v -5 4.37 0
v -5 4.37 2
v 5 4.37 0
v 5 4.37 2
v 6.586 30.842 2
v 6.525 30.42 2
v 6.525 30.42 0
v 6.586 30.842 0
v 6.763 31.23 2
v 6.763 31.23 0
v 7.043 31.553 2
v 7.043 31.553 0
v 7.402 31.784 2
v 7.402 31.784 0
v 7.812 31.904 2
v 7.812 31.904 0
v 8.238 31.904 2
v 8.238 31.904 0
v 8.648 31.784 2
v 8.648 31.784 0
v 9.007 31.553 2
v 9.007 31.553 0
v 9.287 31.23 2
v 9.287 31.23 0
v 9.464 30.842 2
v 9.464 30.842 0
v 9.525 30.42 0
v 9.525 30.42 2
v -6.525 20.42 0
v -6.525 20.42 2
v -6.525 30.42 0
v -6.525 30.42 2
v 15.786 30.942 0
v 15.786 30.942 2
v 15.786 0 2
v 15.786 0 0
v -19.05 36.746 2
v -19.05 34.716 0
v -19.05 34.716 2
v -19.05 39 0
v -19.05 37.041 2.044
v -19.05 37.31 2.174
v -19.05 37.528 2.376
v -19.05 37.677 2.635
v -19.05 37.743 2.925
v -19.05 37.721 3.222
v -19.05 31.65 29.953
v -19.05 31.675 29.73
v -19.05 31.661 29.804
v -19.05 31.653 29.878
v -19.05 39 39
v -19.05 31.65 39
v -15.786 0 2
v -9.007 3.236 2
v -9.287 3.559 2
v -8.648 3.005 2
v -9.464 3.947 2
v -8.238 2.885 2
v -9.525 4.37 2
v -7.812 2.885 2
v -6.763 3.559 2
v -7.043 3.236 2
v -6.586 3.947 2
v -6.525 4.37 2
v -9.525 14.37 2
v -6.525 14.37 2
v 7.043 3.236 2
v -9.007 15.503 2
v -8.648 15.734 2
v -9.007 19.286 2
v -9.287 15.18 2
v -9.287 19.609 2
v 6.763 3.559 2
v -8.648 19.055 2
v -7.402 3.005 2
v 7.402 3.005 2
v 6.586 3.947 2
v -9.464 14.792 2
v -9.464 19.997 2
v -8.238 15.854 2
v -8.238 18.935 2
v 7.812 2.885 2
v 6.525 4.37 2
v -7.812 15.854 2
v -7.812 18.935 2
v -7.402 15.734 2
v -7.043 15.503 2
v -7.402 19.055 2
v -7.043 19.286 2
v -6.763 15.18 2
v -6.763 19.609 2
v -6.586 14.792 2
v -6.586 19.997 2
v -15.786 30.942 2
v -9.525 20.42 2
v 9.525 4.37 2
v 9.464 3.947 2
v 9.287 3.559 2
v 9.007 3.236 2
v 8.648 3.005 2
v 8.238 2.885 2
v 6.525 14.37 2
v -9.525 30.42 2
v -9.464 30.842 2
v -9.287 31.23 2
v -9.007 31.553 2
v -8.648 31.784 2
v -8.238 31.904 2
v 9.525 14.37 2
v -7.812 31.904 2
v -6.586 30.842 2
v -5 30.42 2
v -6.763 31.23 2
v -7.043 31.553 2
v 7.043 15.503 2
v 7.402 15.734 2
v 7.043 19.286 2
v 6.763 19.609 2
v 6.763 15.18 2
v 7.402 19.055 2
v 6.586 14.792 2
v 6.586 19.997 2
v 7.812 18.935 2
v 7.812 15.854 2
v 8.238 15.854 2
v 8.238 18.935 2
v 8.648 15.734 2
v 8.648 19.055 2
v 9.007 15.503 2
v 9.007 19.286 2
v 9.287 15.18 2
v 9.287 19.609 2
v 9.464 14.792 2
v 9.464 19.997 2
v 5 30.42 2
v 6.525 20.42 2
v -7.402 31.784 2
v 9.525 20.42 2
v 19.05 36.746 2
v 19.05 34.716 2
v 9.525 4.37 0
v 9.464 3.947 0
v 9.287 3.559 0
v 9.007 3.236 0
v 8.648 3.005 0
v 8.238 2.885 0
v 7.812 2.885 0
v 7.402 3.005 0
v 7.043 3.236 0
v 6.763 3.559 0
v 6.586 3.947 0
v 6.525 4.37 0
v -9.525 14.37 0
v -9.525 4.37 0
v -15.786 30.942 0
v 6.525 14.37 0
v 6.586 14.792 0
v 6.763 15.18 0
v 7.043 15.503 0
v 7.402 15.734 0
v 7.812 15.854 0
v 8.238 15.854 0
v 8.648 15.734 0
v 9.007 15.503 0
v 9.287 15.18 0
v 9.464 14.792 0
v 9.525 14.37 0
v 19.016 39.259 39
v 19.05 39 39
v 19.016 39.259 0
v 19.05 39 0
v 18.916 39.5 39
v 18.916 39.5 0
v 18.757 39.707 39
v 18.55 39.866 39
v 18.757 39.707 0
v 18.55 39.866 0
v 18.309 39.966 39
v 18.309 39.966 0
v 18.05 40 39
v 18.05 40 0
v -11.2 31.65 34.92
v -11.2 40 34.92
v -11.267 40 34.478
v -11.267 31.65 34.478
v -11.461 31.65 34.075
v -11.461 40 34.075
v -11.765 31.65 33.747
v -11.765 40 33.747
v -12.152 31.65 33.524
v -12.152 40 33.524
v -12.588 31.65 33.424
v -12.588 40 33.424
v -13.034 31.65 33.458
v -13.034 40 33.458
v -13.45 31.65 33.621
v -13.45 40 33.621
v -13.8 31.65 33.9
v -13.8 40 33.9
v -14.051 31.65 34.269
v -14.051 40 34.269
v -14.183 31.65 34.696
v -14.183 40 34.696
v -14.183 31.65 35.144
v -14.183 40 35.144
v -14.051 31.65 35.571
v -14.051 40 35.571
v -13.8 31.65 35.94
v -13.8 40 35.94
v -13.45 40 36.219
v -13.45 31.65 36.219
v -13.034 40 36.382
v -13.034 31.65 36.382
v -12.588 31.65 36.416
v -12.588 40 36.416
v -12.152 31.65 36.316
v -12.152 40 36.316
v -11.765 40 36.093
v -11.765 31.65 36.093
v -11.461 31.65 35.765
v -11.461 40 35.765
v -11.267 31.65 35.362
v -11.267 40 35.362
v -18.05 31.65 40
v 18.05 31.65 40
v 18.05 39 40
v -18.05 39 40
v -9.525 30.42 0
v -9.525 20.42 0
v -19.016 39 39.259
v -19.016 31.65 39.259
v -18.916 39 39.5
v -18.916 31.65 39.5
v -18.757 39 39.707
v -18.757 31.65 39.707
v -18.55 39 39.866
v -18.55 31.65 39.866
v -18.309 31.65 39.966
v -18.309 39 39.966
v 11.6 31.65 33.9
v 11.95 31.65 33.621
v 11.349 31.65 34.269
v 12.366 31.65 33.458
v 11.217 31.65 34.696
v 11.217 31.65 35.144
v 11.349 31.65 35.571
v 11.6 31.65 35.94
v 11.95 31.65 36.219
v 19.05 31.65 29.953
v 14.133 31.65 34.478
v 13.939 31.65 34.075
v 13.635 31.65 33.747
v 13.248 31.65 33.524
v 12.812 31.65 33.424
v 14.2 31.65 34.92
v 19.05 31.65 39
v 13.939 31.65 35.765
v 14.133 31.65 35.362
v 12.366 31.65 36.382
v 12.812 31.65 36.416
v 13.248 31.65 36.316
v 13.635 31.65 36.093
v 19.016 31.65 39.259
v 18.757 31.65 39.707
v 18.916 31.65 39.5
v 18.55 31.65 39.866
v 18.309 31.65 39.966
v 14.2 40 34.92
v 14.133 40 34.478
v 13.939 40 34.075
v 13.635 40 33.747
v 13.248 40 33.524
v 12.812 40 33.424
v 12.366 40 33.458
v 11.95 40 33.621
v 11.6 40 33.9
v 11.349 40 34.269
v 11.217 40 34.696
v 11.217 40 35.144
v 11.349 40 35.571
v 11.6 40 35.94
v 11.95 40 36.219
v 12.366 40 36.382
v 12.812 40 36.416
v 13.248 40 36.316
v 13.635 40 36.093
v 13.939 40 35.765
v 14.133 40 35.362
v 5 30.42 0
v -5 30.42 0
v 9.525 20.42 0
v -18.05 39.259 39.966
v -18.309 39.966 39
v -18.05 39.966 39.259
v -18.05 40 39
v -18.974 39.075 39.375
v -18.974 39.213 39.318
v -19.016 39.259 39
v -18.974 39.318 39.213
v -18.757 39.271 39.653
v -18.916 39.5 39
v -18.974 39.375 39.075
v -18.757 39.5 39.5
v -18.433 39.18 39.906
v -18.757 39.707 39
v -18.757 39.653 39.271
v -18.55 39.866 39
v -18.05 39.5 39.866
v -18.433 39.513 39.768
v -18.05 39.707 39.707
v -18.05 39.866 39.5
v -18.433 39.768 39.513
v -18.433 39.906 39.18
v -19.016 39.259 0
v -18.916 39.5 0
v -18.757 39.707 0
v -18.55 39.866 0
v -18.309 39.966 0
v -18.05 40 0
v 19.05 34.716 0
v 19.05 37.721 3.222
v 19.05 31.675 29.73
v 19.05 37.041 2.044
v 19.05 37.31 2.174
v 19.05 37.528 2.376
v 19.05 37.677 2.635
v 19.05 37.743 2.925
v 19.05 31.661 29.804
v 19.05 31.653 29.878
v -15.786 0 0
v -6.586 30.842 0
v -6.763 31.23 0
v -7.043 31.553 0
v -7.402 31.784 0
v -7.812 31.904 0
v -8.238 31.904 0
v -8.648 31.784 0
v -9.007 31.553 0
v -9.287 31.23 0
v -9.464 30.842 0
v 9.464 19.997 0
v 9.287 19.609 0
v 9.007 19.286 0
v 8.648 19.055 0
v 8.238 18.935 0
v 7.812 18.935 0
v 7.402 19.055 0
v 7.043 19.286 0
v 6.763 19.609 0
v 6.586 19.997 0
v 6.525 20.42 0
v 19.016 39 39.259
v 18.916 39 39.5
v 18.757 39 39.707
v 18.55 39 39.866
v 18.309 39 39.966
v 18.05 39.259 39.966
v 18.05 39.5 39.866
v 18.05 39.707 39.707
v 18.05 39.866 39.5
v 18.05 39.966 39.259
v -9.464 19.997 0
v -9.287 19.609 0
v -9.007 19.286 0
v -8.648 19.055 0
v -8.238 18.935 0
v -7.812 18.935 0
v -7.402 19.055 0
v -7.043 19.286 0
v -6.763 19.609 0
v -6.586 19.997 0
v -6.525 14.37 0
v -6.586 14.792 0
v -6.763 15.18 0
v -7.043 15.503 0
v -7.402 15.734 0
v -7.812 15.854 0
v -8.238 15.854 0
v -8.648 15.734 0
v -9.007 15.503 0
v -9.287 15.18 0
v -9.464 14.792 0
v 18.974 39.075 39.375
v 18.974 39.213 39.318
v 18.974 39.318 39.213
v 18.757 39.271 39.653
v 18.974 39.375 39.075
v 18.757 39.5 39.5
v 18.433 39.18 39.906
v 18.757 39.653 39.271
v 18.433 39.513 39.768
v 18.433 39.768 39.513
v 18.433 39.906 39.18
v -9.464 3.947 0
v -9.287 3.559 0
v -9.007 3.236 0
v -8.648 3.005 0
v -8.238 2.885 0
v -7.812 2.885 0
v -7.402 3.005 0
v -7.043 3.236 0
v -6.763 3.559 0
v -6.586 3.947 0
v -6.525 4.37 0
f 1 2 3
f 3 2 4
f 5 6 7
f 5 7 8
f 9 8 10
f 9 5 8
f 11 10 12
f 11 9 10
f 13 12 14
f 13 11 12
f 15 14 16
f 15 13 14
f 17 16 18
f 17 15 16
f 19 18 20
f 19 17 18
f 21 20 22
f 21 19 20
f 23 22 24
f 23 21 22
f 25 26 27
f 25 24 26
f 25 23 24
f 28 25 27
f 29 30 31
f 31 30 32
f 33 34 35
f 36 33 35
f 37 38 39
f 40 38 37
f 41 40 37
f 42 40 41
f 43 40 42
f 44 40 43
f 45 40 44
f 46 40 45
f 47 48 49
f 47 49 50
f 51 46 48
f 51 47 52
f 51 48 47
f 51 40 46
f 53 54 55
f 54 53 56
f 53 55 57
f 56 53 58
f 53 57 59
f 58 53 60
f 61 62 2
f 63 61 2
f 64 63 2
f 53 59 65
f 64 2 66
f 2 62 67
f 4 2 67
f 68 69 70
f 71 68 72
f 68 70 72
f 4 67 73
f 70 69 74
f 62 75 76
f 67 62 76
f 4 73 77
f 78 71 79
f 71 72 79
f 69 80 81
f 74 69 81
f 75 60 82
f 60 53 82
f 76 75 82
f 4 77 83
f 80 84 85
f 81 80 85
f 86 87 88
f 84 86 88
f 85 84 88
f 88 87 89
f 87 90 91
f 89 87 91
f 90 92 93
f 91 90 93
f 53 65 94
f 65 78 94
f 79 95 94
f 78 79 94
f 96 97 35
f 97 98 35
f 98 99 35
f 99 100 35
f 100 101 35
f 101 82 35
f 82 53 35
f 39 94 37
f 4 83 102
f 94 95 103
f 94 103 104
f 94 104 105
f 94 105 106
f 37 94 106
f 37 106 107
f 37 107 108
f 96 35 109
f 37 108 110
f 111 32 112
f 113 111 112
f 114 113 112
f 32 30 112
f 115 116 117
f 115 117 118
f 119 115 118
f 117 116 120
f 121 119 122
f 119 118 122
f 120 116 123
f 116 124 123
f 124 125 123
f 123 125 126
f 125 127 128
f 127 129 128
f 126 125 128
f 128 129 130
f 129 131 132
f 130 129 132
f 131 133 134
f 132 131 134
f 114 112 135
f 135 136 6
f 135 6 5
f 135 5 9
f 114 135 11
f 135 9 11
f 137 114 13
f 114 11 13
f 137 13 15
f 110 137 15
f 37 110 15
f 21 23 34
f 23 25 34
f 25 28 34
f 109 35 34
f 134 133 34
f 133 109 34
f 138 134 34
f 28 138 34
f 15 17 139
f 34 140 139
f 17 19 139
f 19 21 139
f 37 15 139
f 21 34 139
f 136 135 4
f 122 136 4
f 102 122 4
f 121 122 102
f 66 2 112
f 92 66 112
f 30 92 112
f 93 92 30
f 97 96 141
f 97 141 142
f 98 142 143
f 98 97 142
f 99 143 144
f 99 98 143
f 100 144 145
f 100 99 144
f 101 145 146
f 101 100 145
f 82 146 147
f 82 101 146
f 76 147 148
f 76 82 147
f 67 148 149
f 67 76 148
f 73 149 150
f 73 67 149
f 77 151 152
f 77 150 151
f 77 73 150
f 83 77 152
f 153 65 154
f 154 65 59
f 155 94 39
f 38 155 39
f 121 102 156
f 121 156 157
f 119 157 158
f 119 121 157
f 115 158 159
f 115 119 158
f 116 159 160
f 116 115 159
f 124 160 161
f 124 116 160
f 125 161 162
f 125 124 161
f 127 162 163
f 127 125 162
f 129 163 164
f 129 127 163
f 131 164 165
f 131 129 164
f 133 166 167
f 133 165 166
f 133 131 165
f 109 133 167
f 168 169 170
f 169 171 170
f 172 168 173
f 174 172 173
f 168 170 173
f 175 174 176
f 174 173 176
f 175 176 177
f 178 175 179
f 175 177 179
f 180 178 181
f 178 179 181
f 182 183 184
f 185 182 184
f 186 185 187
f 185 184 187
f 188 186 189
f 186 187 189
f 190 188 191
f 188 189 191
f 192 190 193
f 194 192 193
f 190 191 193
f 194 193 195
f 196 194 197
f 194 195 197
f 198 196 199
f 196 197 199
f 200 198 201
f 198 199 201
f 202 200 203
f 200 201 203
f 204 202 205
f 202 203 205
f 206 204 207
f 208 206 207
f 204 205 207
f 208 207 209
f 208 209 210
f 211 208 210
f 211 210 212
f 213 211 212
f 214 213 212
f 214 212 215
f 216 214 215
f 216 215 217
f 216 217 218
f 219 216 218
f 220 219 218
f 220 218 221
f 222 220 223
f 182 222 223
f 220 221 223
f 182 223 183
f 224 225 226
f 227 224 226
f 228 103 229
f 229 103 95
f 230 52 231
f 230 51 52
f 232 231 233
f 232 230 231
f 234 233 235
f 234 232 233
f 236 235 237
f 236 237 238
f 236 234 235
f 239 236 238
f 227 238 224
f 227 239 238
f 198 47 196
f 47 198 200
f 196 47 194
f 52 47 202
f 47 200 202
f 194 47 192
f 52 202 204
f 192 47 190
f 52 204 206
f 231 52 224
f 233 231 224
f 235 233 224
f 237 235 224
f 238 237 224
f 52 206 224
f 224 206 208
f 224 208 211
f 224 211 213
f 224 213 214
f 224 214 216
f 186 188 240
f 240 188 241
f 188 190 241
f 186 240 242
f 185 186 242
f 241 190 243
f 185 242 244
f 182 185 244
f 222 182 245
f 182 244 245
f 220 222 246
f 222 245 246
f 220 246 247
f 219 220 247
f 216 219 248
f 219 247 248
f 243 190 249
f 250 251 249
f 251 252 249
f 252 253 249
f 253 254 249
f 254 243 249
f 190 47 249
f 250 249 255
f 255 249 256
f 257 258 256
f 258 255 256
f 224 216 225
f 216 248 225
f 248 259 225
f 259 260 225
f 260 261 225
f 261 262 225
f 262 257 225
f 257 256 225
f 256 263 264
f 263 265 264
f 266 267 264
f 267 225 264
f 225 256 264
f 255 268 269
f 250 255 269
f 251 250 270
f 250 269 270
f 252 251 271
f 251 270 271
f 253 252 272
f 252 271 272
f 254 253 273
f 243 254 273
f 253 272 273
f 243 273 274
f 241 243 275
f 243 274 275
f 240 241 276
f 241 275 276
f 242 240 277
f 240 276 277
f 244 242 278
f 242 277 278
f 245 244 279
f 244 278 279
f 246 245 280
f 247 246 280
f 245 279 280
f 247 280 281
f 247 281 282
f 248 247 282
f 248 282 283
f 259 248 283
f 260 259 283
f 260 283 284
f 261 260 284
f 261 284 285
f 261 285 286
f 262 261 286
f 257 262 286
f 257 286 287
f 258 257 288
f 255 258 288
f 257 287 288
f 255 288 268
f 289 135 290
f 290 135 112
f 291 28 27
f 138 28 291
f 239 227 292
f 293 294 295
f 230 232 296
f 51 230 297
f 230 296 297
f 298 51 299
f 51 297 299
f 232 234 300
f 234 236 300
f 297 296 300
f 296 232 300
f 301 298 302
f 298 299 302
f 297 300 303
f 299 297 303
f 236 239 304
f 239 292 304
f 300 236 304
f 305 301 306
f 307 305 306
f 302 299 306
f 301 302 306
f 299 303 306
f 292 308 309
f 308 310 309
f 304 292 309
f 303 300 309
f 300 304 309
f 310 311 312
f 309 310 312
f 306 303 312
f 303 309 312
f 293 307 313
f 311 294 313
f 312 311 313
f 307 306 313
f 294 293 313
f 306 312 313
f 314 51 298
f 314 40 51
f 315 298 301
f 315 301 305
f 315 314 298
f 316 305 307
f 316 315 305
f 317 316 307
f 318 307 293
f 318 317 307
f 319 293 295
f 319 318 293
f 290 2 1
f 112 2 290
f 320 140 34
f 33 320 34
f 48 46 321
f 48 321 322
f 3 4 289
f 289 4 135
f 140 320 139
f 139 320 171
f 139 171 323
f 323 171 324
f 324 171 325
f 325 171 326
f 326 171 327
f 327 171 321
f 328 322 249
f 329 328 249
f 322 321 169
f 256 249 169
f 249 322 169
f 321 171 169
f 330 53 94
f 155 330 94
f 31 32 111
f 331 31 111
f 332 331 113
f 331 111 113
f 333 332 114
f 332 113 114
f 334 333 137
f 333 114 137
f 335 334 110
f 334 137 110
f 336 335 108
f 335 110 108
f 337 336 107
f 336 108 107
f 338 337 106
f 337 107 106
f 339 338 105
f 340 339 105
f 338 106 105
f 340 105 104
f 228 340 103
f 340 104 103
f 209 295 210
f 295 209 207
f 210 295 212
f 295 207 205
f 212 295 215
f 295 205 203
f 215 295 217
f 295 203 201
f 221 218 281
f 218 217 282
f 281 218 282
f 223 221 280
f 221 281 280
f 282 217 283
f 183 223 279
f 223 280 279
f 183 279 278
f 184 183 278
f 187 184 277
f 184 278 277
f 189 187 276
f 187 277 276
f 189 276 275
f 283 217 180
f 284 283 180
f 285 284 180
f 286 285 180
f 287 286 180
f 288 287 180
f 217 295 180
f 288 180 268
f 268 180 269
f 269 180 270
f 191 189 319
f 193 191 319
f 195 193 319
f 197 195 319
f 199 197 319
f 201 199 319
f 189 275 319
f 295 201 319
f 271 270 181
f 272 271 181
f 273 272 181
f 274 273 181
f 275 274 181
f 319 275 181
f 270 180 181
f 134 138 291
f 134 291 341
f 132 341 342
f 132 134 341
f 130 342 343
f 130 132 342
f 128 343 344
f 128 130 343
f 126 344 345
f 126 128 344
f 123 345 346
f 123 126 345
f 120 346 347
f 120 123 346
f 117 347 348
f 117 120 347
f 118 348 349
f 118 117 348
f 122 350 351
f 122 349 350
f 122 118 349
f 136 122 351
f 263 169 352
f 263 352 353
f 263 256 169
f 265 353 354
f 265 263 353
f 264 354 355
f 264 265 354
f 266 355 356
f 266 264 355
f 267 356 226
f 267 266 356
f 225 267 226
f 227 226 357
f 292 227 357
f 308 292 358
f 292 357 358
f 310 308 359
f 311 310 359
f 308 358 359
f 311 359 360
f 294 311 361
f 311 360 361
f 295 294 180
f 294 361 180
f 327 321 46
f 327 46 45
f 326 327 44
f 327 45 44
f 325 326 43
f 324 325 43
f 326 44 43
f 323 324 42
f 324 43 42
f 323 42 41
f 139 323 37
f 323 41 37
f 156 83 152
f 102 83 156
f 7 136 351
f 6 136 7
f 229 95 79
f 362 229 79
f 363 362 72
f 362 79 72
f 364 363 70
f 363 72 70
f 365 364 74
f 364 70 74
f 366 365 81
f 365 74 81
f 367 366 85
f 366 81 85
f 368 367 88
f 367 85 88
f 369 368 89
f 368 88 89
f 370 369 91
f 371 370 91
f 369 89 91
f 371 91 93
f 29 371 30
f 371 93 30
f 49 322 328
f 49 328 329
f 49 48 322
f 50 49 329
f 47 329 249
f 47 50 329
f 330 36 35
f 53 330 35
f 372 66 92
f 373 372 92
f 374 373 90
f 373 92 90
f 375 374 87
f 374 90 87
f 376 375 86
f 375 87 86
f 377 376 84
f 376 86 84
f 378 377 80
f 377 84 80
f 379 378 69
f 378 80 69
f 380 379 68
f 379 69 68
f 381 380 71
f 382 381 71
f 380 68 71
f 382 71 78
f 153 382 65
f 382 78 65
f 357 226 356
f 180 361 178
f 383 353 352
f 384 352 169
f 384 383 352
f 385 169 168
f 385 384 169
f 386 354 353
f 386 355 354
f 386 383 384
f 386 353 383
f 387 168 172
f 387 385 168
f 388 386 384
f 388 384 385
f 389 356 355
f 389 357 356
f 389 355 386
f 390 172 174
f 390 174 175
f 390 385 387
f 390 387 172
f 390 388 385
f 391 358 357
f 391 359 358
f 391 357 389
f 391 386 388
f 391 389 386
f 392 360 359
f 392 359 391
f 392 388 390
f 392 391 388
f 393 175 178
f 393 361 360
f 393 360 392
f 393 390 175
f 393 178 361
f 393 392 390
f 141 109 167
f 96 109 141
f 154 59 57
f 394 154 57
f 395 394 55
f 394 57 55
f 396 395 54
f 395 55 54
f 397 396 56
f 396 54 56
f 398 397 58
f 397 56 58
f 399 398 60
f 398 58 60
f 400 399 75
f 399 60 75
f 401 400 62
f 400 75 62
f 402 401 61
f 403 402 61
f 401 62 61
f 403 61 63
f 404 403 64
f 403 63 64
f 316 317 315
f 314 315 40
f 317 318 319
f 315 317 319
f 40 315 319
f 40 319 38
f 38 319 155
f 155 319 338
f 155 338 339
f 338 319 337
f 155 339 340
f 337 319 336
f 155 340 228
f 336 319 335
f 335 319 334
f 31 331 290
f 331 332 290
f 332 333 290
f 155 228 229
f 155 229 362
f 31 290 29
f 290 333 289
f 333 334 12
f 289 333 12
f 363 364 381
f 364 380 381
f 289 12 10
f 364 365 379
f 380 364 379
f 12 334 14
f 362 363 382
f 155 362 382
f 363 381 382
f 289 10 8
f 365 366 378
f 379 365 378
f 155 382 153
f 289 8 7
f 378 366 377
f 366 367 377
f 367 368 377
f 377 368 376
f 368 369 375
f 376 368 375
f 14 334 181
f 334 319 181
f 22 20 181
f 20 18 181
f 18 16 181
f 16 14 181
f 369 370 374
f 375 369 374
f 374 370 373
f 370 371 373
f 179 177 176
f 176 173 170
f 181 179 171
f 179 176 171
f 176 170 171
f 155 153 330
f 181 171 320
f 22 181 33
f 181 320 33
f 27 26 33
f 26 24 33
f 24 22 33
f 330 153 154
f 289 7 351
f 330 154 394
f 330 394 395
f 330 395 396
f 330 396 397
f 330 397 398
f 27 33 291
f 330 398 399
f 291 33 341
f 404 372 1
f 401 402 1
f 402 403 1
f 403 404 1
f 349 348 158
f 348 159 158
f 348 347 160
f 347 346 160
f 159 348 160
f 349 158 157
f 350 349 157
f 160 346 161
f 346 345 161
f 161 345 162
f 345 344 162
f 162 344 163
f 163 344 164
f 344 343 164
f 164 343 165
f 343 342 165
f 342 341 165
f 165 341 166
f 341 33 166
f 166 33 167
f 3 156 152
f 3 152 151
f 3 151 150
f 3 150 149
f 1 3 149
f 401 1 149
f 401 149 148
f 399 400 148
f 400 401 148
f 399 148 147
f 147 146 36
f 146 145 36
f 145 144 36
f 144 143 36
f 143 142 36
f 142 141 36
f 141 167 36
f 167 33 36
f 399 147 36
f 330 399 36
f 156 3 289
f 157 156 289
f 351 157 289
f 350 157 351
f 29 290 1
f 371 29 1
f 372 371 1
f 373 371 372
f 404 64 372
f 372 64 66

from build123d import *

# Parameters (mm, degrees)
BOSS_EXTRUDE1_DEPTH = 19.05
SKETCH3_W           = 5
SKETCH3_H           = 26.05
CUT_EXTRUDE2_DEPTH  = 3
BOSS_EXTRUDE2_DEPTH = 38.1
SKETCH5_R           = 1.5
CUT_EXTRUDE3_DEPTH  = 8.35
FILLET1_R           = 1


with BuildPart() as part:
    # Sketch1 → Boss-Extrude1 (new body, symmetric)
    with BuildSketch(Plane(origin=(0, 0, 0), x_dir=(0, 0, -1), z_dir=(1, 0, 0))):
        Polygon((0, 0), (-2, 0), (-2, 38), (-40, 38), (-40, 40), (0, 40), align=None)
    extrude(amount=BOSS_EXTRUDE1_DEPTH, both=True)

    # Sketch3 → Cut-Extrude2 (cut, through all)
    with BuildSketch(Plane.XY.offset(2)):
        with Locations((2.5, 17.394531681)):
            Rectangle(SKETCH3_W, SKETCH3_H)
        with Locations((-2.5, 17.394531681)):
            Rectangle(SKETCH3_W, SKETCH3_H)
        with BuildLine():
            Line((-9.525, 30.419531681), (-9.525, 20.419531681))
            ThreePointArc((-9.525, 20.419531681), (-8.025, 18.919531681), (-6.525, 20.419531681))
            Line((-6.525, 20.419531681), (-6.525, 30.419531681))
            ThreePointArc((-6.525, 30.419531681), (-8.025, 31.919531681), (-9.525, 30.419531681))
        make_face()
        with BuildLine():
            Line((-9.525, 14.369531681), (-9.525, 4.369531681))
            ThreePointArc((-9.525, 4.369531681), (-8.025, 2.869531681), (-6.525, 4.369531681))
            Line((-6.525, 4.369531681), (-6.525, 14.369531681))
            ThreePointArc((-6.525, 14.369531681), (-8.025, 15.869531681), (-9.525, 14.369531681))
        make_face()
        with BuildLine():
            ThreePointArc((9.525, 20.419531681), (8.025, 18.919531681), (6.525, 20.419531681))
            Line((6.525, 20.419531681), (6.525, 30.419531681))
            ThreePointArc((6.525, 30.419531681), (8.025, 31.919531681), (9.525, 30.419531681))
            Line((9.525, 30.419531681), (9.525, 20.419531681))
        make_face()
        with BuildLine():
            ThreePointArc((9.525, 4.369531681), (8.025, 2.869531681), (6.525, 4.369531681))
            Line((6.525, 4.369531681), (6.525, 14.369531681))
            ThreePointArc((6.525, 14.369531681), (8.025, 15.869531681), (9.525, 14.369531681))
            Line((9.525, 14.369531681), (9.525, 4.369531681))
        make_face()
        Polygon((-15.786412439, 30.942427664), (-19.05, 34.716026675), (-19.05, 0), (-15.786412439, 0), align=None)
        Polygon((15.786412439, 30.942427664), (15.786412439, 0), (19.05, 0), (19.05, 34.716026675), align=None)
    extrude(amount=-CUT_EXTRUDE2_DEPTH, mode=Mode.SUBTRACT)

    # Sketch4 → Boss-Extrude2 (add)
    with BuildSketch(Plane(origin=(19.05, 0, 0), x_dir=(0, 0, -1), z_dir=(1, 0, 0))):
        Polygon((-2, 38), (-29.84, 31.65), (-40, 31.65), (-40, 38), align=None)
    extrude(amount=-BOSS_EXTRUDE2_DEPTH)

    # Sketch5 → Cut-Extrude3 (cut)
    with BuildSketch(Plane(origin=(0, 40, 0), x_dir=(1, 0, 0), z_dir=(0, 1, 0))):
        with Locations((-12.7, -34.92)):
            Circle(SKETCH5_R)
        with Locations((12.7, -34.92)):
            Circle(SKETCH5_R)
    extrude(amount=-CUT_EXTRUDE3_DEPTH, mode=Mode.SUBTRACT)

    # Fillet1
    fillet1_edges = [part.edges().sort_by_distance(p)[0] for p in [
        (0, 38, 2),
        (0, 40, 40),
        (0, 31.65, 29.84),
        (19.05, 35.825, 40),
        (-19.05, 35.825, 40),
        (-19.05, 40, 20),
        (19.05, 40, 20),
    ]]
    fillet(fillet1_edges, radius=FILLET1_R)


solid = part.part
